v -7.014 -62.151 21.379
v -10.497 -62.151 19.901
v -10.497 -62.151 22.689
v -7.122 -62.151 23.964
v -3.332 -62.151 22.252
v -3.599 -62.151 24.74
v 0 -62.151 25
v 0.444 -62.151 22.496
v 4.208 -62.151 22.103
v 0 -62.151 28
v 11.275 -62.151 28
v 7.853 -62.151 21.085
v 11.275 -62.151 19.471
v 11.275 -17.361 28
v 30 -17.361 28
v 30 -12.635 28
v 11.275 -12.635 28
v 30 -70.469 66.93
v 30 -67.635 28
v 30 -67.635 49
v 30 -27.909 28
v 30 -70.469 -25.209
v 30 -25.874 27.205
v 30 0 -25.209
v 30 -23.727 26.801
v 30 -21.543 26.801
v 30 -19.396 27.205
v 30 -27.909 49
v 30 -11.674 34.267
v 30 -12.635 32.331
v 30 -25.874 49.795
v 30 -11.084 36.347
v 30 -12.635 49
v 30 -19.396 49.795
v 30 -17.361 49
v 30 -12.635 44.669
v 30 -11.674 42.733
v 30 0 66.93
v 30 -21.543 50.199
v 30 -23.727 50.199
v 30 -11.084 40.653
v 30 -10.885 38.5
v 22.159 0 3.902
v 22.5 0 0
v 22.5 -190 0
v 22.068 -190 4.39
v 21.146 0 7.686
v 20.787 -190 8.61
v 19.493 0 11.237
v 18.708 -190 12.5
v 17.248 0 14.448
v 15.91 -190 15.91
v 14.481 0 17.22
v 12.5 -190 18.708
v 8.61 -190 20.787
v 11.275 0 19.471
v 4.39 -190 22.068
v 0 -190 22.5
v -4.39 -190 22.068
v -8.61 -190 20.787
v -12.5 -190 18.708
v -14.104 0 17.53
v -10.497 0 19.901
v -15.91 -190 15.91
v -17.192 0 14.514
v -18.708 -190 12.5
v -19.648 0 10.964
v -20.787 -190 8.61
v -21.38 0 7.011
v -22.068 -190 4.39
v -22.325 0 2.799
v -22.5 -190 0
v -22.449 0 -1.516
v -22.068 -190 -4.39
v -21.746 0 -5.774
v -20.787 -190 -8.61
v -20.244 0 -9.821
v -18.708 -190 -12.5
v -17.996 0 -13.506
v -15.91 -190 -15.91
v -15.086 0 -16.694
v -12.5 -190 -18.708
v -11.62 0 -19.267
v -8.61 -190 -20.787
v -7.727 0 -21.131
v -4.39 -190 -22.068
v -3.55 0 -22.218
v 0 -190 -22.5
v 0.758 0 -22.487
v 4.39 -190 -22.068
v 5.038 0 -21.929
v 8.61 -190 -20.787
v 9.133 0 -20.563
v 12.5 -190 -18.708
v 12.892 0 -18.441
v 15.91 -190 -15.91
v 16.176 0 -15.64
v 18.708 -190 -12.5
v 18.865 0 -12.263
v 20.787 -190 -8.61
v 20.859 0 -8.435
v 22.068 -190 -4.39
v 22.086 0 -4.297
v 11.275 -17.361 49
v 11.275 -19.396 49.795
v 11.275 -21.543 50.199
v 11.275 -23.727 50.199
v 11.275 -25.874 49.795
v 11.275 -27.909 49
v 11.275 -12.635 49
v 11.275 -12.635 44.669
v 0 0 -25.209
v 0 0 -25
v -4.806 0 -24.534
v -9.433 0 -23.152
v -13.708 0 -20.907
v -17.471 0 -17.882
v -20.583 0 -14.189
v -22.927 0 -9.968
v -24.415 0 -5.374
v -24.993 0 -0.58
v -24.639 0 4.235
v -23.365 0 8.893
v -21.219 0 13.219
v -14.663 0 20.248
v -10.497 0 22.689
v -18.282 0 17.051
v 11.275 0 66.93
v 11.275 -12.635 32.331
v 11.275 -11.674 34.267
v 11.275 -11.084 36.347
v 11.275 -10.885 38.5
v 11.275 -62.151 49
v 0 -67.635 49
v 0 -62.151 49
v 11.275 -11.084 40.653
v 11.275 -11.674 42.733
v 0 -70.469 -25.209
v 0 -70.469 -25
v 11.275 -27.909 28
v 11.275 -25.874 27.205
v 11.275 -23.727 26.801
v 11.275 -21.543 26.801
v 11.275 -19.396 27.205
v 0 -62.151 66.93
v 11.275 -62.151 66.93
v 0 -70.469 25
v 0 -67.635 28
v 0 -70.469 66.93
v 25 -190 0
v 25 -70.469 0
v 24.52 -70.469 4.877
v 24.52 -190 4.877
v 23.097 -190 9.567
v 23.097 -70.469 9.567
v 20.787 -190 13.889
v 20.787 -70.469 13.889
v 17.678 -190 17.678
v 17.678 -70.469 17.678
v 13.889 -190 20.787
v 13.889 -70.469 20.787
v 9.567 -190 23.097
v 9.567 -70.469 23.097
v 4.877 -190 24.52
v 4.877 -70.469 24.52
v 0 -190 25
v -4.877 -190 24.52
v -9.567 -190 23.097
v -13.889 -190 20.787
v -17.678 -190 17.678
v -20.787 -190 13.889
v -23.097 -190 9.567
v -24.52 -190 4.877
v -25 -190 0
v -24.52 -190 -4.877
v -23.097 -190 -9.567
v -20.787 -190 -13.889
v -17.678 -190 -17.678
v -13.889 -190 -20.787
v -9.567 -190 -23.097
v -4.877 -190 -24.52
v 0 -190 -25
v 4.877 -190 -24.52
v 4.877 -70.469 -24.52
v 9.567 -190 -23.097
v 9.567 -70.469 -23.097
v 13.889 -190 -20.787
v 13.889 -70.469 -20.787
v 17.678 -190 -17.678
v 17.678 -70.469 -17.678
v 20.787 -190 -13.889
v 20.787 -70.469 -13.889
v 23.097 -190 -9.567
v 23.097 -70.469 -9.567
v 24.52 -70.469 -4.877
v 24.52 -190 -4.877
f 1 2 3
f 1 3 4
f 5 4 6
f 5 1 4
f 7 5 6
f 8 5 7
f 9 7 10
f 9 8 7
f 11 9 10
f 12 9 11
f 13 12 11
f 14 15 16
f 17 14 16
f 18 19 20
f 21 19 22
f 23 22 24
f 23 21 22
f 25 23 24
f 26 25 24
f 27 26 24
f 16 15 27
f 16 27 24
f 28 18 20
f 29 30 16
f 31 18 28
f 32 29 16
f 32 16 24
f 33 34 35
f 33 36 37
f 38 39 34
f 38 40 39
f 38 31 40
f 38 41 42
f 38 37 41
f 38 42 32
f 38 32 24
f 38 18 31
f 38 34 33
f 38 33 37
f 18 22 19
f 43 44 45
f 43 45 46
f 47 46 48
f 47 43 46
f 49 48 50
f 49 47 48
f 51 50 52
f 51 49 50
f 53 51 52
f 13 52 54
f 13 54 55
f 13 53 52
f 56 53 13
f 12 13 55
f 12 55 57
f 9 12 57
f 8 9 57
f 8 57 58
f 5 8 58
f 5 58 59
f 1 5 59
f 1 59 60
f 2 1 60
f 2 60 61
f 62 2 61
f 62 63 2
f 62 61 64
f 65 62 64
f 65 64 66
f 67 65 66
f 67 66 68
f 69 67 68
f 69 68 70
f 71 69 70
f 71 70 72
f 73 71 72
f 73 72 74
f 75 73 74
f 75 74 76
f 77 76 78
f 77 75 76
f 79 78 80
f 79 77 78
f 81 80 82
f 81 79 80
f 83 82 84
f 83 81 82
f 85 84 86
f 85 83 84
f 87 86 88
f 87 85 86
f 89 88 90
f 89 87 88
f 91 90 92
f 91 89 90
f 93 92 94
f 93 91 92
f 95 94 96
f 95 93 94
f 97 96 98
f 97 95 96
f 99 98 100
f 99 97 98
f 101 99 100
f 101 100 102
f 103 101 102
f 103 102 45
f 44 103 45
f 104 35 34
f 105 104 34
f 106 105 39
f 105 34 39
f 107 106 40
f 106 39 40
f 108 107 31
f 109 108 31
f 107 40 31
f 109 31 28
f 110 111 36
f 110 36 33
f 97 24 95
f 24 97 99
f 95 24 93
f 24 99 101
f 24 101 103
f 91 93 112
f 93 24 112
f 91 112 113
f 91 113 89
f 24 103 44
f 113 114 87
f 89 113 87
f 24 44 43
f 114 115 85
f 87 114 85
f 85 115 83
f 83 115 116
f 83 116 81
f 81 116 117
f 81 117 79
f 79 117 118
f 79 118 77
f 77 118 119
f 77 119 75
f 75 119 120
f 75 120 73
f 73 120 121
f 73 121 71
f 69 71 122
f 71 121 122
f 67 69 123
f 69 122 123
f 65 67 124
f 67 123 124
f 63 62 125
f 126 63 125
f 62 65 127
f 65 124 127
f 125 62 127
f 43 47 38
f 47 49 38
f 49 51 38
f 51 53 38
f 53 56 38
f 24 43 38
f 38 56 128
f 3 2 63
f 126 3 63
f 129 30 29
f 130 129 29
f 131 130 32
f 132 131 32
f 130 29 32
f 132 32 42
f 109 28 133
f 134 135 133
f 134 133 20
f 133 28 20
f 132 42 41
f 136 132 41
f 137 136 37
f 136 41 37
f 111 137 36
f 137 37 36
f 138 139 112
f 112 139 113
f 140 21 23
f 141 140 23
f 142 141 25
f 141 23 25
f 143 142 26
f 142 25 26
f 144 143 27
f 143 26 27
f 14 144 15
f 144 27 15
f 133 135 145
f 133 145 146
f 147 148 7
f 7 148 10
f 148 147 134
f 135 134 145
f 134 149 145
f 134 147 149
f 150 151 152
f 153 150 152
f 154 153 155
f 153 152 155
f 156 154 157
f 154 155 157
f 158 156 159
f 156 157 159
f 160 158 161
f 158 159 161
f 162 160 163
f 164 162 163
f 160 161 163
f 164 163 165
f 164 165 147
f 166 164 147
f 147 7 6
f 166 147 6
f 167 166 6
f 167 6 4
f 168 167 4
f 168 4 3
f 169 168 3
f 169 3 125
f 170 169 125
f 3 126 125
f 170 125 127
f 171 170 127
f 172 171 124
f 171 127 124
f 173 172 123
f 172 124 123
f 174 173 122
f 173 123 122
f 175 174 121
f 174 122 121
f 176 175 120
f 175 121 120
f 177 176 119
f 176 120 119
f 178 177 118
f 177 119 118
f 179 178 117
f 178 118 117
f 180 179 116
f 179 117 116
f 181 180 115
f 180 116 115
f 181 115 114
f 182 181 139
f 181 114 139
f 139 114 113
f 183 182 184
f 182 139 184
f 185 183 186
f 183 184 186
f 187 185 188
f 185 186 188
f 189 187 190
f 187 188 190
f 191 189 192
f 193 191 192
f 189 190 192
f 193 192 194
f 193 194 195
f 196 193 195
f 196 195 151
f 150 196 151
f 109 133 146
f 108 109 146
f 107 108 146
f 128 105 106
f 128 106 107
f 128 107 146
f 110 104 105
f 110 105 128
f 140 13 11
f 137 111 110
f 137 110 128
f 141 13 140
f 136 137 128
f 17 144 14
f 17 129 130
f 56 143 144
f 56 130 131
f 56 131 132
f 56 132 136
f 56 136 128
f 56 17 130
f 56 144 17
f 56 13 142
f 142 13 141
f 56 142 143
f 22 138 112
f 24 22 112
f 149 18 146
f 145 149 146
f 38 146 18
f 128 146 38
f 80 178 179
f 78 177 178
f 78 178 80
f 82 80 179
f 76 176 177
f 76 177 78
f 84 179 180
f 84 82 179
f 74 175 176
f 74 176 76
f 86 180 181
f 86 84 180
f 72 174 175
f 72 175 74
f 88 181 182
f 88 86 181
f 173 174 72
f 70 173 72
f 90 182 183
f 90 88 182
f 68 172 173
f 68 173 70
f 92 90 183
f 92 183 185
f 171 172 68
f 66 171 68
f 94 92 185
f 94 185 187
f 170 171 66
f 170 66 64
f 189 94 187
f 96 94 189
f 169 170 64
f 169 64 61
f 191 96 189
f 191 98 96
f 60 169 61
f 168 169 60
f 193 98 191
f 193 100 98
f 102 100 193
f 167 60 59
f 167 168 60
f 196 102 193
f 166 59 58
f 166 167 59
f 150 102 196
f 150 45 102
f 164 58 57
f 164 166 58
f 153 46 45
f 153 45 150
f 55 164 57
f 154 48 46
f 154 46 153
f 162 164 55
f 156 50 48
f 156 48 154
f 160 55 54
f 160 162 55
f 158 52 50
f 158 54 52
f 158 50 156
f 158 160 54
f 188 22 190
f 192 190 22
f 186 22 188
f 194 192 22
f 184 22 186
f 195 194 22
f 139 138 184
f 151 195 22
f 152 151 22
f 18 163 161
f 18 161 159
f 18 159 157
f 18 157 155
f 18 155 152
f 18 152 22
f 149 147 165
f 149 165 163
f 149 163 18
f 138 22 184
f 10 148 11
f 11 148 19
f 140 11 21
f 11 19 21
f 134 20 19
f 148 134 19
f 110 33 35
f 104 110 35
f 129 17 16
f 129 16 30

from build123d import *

# Parameters (mm, degrees)
F0_R     = 25
F0_R_2   = 22.5
F1_DEPTH = 190
F2_W     = 70.4685077071
F2_H     = 92.139782384
F3_DEPTH = 30
F4_R     = 22.5
F5_DEPTH = 100
F6_W     = 21.7724195682
F6_H     = 62.1514879167
F7_DEPTH = 100
F9_DEPTH = 100


with BuildPart() as f1:
    # F0 (on Front) → F1 (new body)
    with BuildSketch(Plane.XZ):
        Circle(F0_R)
        Circle(F0_R_2, mode=Mode.SUBTRACT)
    extrude(amount=F1_DEPTH)

    # F2 (on Right) → F3 (join)
    with BuildSketch(Plane.YZ):
        with Locations((-35.2342538536, 20.8604475483)):
            Rectangle(F2_W, F2_H)
    extrude(amount=F3_DEPTH)

    # F4 (on face) → F5 (cut, symmetric)
    with BuildSketch(Plane.XZ.offset(70.4685077071)):
        Circle(F4_R)
    extrude(amount=F5_DEPTH, both=True, mode=Mode.SUBTRACT)

    # F6 (on Top) → F7 (cut)
    with BuildSketch(Plane.XY):
        with Locations((0.3888274077, -31.0757439584)):
            Rectangle(F6_W, F6_H)
    extrude(amount=F7_DEPTH, mode=Mode.SUBTRACT)

    # F8 (on face) → F9 (cut)
    with BuildSketch(Plane.YZ.offset(30)):
        with BuildLine():
            Line((-27.9086115654, 49), (-67.634855788, 49))
            Line((-67.634855788, 49), (-67.634855788, 38.5))
            Line((-67.634855788, 38.5), (-34.384855788, 38.5))
            ThreePointArc((-34.384855788, 38.5), (-32.6355840211, 44.6683008039), (-27.9086115654, 49))
        make_face()
        with BuildLine():
            ThreePointArc((-17.3611000106, 49), (-22.634855788, 50.25), (-27.9086115654, 49))
            Line((-27.9086115654, 49), (-17.3611000106, 49))
        make_face()
        with BuildLine():
            Line((-17.3611000106, 49), (-27.9086115654, 49))
            ThreePointArc((-27.9086115654, 49), (-32.6355840211, 44.6683008039), (-34.384855788, 38.5))
            Line((-34.384855788, 38.5), (-22.634855788, 38.5))
            Line((-22.634855788, 38.5), (-12.634855788, 38.5))
            Line((-12.634855788, 38.5), (-12.634855788, 44.6694813396))
            ThreePointArc((-12.634855788, 44.6694813396), (-14.696956075, 47.1632700608), (-17.3611000106, 49))
        make_face()
        with BuildLine():
            Line((-34.384855788, 38.5), (-67.634855788, 38.5))
            Line((-67.634855788, 38.5), (-67.634855788, 28))
            Line((-67.634855788, 28), (-27.9086115654, 28))
            ThreePointArc((-27.9086115654, 28), (-32.6355840211, 32.3316991961), (-34.384855788, 38.5))
        make_face()
        with BuildLine():
            Line((-12.634855788, 49), (-17.3611000106, 49))
            ThreePointArc((-17.3611000106, 49), (-14.696956075, 47.1632700608), (-12.634855788, 44.6694813396))
            Line((-12.634855788, 44.6694813396), (-12.634855788, 49))
        make_face()
        with BuildLine():
            Line((-22.634855788, 38.5), (-34.384855788, 38.5))
            ThreePointArc((-34.384855788, 38.5), (-32.6355840211, 32.3316991961), (-27.9086115654, 28))
            Line((-27.9086115654, 28), (-17.3611000106, 28))
            ThreePointArc((-17.3611000106, 28), (-14.696956075, 29.8367299392), (-12.634855788, 32.3305186604))
            Line((-12.634855788, 32.3305186604), (-12.634855788, 38.5))
            Line((-12.634855788, 38.5), (-22.634855788, 38.5))
        make_face()
        with BuildLine():
            ThreePointArc((-10.884855788, 38.5), (-11.3308188984, 41.7064388346), (-12.634855788, 44.6694813396))
            Line((-12.634855788, 44.6694813396), (-12.634855788, 38.5))
            Line((-12.634855788, 38.5), (-10.884855788, 38.5))
        make_face()
        with BuildLine():
            Line((-17.3611000106, 28), (-27.9086115654, 28))
            ThreePointArc((-27.9086115654, 28), (-22.634855788, 26.75), (-17.3611000106, 28))
        make_face()
        with BuildLine():
            Line((-10.884855788, 38.5), (-12.634855788, 38.5))
            Line((-12.634855788, 38.5), (-12.634855788, 32.3305186604))
            ThreePointArc((-12.634855788, 32.3305186604), (-11.3308188984, 35.2935611654), (-10.884855788, 38.5))
        make_face()
        with BuildLine():
            ThreePointArc((-12.634855788, 32.3305186604), (-14.696956075, 29.8367299392), (-17.3611000106, 28))
            Line((-17.3611000106, 28), (-12.634855788, 28))
            Line((-12.634855788, 28), (-12.634855788, 32.3305186604))
        make_face()
    extrude(amount=-F9_DEPTH, mode=Mode.SUBTRACT)


solid = f1.part
